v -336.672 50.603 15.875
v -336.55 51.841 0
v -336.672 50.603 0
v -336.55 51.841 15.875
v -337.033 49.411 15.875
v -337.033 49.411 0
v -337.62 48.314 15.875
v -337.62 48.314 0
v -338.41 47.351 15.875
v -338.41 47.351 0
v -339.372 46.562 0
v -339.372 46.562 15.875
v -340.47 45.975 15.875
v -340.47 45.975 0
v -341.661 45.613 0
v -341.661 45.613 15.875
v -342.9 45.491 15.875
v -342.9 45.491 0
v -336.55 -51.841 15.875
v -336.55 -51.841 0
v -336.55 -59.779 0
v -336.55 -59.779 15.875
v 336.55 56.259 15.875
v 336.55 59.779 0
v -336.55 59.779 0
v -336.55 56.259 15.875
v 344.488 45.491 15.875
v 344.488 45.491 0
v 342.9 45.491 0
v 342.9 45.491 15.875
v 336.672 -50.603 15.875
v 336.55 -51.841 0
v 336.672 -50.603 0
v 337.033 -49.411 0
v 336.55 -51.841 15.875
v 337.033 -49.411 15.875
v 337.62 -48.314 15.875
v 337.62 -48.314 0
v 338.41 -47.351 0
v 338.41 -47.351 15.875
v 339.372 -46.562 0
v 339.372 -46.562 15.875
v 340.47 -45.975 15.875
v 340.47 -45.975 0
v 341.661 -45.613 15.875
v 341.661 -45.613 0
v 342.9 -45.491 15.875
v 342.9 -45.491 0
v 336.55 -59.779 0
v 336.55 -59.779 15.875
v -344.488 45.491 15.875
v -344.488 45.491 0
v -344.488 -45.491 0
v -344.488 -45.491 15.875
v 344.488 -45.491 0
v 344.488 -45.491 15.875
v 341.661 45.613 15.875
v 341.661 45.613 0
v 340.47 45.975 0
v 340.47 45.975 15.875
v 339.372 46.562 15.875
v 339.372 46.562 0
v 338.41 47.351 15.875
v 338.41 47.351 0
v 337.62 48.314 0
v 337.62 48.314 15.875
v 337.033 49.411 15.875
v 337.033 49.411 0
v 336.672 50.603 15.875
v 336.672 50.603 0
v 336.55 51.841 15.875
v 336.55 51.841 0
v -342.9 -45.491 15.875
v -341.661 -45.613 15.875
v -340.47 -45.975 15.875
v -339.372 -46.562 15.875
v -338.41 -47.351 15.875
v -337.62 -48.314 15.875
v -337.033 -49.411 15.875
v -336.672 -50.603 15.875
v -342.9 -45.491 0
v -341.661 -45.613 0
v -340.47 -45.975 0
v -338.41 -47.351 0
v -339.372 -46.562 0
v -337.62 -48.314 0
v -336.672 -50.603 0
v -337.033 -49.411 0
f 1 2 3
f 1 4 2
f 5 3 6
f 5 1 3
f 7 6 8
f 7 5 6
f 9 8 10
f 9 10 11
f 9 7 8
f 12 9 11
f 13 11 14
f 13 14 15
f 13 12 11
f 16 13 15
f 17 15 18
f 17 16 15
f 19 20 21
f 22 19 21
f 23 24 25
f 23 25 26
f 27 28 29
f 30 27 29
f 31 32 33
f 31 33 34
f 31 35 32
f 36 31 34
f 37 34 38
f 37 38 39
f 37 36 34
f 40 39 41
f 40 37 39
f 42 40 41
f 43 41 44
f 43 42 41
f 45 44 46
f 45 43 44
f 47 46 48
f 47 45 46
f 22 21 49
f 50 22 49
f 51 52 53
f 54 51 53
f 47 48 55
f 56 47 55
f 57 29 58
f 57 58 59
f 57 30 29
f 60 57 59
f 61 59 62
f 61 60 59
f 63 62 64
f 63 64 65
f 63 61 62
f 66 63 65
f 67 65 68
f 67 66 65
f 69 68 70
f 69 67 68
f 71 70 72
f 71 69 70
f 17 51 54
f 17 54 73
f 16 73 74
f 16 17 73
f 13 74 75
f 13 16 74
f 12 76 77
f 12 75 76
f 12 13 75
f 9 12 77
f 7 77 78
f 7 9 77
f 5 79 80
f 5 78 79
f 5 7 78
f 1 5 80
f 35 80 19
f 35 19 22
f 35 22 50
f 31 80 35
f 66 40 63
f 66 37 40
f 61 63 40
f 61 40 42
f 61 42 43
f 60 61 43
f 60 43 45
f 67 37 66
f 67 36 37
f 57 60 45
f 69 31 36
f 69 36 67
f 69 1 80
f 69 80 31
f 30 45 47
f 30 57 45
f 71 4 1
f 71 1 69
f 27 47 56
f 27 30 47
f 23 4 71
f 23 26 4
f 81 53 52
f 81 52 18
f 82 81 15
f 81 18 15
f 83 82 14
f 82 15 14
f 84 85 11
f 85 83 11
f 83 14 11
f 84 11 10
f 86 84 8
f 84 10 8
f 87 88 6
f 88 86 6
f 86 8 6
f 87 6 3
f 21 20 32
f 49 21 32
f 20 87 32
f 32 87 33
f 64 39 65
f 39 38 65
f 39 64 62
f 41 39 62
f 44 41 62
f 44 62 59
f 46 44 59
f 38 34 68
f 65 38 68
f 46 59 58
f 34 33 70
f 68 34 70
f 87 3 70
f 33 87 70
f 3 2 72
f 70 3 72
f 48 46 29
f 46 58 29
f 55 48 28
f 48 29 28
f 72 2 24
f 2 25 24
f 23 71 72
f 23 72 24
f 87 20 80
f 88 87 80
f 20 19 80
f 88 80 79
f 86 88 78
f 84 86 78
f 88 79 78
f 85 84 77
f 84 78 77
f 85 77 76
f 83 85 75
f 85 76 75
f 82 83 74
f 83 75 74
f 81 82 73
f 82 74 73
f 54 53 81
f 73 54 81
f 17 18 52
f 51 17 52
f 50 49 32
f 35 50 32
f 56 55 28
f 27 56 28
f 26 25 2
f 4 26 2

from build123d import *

# Parameters (mm, degrees)
BOSS_EXTRUDE1_DEPTH     = 15.875
FILLET1_R               = 6.35
CUT_EXTRUDE1_DEPTH      = 1
CUT_EXTRUDE1_DEPTH_BACK = 689.975


with BuildPart() as part:
    # Sketch1 → Boss-Extrude1 (new body)
    with BuildSketch(Plane.XY):
        Polygon((-336.55, -45.4914), (-336.55, -59.7789), (336.55, -59.7789), (336.55, -45.4914), (344.4875, -45.4914), (344.4875, 45.4914), (336.55, 45.4914), (336.55, 59.7789), (-336.55, 59.7789), (-336.55, 45.4914), (-344.4875, 45.4914), (-344.4875, -45.4914), align=None)
    extrude(amount=BOSS_EXTRUDE1_DEPTH)

    # Fillet1
    fillet1_edges = [part.edges().sort_by_distance(p)[0] for p in [
        (-336.55, 45.4914, 7.9375),
        (-336.55, -45.4914, 7.9375),
        (336.55, -45.4914, 7.9375),
        (336.55, 45.4914, 7.9375),
    ]]
    fillet(fillet1_edges, radius=FILLET1_R)

    # Sketch2 → Cut-Extrude1 (cut, two sides)
    with BuildSketch(Plane(origin=(344.4875, 0, 0), x_dir=(0, 0, -1), z_dir=(1, 0, 0))) as cut_extrude1_sk:
        Polygon((0, 59.7789), (-15.875, 56.259497231), (-15.875, 59.7789), align=None)
    extrude(amount=CUT_EXTRUDE1_DEPTH, mode=Mode.SUBTRACT)
    extrude(cut_extrude1_sk.sketch, amount=-CUT_EXTRUDE1_DEPTH_BACK, mode=Mode.SUBTRACT)


solid = part.part
